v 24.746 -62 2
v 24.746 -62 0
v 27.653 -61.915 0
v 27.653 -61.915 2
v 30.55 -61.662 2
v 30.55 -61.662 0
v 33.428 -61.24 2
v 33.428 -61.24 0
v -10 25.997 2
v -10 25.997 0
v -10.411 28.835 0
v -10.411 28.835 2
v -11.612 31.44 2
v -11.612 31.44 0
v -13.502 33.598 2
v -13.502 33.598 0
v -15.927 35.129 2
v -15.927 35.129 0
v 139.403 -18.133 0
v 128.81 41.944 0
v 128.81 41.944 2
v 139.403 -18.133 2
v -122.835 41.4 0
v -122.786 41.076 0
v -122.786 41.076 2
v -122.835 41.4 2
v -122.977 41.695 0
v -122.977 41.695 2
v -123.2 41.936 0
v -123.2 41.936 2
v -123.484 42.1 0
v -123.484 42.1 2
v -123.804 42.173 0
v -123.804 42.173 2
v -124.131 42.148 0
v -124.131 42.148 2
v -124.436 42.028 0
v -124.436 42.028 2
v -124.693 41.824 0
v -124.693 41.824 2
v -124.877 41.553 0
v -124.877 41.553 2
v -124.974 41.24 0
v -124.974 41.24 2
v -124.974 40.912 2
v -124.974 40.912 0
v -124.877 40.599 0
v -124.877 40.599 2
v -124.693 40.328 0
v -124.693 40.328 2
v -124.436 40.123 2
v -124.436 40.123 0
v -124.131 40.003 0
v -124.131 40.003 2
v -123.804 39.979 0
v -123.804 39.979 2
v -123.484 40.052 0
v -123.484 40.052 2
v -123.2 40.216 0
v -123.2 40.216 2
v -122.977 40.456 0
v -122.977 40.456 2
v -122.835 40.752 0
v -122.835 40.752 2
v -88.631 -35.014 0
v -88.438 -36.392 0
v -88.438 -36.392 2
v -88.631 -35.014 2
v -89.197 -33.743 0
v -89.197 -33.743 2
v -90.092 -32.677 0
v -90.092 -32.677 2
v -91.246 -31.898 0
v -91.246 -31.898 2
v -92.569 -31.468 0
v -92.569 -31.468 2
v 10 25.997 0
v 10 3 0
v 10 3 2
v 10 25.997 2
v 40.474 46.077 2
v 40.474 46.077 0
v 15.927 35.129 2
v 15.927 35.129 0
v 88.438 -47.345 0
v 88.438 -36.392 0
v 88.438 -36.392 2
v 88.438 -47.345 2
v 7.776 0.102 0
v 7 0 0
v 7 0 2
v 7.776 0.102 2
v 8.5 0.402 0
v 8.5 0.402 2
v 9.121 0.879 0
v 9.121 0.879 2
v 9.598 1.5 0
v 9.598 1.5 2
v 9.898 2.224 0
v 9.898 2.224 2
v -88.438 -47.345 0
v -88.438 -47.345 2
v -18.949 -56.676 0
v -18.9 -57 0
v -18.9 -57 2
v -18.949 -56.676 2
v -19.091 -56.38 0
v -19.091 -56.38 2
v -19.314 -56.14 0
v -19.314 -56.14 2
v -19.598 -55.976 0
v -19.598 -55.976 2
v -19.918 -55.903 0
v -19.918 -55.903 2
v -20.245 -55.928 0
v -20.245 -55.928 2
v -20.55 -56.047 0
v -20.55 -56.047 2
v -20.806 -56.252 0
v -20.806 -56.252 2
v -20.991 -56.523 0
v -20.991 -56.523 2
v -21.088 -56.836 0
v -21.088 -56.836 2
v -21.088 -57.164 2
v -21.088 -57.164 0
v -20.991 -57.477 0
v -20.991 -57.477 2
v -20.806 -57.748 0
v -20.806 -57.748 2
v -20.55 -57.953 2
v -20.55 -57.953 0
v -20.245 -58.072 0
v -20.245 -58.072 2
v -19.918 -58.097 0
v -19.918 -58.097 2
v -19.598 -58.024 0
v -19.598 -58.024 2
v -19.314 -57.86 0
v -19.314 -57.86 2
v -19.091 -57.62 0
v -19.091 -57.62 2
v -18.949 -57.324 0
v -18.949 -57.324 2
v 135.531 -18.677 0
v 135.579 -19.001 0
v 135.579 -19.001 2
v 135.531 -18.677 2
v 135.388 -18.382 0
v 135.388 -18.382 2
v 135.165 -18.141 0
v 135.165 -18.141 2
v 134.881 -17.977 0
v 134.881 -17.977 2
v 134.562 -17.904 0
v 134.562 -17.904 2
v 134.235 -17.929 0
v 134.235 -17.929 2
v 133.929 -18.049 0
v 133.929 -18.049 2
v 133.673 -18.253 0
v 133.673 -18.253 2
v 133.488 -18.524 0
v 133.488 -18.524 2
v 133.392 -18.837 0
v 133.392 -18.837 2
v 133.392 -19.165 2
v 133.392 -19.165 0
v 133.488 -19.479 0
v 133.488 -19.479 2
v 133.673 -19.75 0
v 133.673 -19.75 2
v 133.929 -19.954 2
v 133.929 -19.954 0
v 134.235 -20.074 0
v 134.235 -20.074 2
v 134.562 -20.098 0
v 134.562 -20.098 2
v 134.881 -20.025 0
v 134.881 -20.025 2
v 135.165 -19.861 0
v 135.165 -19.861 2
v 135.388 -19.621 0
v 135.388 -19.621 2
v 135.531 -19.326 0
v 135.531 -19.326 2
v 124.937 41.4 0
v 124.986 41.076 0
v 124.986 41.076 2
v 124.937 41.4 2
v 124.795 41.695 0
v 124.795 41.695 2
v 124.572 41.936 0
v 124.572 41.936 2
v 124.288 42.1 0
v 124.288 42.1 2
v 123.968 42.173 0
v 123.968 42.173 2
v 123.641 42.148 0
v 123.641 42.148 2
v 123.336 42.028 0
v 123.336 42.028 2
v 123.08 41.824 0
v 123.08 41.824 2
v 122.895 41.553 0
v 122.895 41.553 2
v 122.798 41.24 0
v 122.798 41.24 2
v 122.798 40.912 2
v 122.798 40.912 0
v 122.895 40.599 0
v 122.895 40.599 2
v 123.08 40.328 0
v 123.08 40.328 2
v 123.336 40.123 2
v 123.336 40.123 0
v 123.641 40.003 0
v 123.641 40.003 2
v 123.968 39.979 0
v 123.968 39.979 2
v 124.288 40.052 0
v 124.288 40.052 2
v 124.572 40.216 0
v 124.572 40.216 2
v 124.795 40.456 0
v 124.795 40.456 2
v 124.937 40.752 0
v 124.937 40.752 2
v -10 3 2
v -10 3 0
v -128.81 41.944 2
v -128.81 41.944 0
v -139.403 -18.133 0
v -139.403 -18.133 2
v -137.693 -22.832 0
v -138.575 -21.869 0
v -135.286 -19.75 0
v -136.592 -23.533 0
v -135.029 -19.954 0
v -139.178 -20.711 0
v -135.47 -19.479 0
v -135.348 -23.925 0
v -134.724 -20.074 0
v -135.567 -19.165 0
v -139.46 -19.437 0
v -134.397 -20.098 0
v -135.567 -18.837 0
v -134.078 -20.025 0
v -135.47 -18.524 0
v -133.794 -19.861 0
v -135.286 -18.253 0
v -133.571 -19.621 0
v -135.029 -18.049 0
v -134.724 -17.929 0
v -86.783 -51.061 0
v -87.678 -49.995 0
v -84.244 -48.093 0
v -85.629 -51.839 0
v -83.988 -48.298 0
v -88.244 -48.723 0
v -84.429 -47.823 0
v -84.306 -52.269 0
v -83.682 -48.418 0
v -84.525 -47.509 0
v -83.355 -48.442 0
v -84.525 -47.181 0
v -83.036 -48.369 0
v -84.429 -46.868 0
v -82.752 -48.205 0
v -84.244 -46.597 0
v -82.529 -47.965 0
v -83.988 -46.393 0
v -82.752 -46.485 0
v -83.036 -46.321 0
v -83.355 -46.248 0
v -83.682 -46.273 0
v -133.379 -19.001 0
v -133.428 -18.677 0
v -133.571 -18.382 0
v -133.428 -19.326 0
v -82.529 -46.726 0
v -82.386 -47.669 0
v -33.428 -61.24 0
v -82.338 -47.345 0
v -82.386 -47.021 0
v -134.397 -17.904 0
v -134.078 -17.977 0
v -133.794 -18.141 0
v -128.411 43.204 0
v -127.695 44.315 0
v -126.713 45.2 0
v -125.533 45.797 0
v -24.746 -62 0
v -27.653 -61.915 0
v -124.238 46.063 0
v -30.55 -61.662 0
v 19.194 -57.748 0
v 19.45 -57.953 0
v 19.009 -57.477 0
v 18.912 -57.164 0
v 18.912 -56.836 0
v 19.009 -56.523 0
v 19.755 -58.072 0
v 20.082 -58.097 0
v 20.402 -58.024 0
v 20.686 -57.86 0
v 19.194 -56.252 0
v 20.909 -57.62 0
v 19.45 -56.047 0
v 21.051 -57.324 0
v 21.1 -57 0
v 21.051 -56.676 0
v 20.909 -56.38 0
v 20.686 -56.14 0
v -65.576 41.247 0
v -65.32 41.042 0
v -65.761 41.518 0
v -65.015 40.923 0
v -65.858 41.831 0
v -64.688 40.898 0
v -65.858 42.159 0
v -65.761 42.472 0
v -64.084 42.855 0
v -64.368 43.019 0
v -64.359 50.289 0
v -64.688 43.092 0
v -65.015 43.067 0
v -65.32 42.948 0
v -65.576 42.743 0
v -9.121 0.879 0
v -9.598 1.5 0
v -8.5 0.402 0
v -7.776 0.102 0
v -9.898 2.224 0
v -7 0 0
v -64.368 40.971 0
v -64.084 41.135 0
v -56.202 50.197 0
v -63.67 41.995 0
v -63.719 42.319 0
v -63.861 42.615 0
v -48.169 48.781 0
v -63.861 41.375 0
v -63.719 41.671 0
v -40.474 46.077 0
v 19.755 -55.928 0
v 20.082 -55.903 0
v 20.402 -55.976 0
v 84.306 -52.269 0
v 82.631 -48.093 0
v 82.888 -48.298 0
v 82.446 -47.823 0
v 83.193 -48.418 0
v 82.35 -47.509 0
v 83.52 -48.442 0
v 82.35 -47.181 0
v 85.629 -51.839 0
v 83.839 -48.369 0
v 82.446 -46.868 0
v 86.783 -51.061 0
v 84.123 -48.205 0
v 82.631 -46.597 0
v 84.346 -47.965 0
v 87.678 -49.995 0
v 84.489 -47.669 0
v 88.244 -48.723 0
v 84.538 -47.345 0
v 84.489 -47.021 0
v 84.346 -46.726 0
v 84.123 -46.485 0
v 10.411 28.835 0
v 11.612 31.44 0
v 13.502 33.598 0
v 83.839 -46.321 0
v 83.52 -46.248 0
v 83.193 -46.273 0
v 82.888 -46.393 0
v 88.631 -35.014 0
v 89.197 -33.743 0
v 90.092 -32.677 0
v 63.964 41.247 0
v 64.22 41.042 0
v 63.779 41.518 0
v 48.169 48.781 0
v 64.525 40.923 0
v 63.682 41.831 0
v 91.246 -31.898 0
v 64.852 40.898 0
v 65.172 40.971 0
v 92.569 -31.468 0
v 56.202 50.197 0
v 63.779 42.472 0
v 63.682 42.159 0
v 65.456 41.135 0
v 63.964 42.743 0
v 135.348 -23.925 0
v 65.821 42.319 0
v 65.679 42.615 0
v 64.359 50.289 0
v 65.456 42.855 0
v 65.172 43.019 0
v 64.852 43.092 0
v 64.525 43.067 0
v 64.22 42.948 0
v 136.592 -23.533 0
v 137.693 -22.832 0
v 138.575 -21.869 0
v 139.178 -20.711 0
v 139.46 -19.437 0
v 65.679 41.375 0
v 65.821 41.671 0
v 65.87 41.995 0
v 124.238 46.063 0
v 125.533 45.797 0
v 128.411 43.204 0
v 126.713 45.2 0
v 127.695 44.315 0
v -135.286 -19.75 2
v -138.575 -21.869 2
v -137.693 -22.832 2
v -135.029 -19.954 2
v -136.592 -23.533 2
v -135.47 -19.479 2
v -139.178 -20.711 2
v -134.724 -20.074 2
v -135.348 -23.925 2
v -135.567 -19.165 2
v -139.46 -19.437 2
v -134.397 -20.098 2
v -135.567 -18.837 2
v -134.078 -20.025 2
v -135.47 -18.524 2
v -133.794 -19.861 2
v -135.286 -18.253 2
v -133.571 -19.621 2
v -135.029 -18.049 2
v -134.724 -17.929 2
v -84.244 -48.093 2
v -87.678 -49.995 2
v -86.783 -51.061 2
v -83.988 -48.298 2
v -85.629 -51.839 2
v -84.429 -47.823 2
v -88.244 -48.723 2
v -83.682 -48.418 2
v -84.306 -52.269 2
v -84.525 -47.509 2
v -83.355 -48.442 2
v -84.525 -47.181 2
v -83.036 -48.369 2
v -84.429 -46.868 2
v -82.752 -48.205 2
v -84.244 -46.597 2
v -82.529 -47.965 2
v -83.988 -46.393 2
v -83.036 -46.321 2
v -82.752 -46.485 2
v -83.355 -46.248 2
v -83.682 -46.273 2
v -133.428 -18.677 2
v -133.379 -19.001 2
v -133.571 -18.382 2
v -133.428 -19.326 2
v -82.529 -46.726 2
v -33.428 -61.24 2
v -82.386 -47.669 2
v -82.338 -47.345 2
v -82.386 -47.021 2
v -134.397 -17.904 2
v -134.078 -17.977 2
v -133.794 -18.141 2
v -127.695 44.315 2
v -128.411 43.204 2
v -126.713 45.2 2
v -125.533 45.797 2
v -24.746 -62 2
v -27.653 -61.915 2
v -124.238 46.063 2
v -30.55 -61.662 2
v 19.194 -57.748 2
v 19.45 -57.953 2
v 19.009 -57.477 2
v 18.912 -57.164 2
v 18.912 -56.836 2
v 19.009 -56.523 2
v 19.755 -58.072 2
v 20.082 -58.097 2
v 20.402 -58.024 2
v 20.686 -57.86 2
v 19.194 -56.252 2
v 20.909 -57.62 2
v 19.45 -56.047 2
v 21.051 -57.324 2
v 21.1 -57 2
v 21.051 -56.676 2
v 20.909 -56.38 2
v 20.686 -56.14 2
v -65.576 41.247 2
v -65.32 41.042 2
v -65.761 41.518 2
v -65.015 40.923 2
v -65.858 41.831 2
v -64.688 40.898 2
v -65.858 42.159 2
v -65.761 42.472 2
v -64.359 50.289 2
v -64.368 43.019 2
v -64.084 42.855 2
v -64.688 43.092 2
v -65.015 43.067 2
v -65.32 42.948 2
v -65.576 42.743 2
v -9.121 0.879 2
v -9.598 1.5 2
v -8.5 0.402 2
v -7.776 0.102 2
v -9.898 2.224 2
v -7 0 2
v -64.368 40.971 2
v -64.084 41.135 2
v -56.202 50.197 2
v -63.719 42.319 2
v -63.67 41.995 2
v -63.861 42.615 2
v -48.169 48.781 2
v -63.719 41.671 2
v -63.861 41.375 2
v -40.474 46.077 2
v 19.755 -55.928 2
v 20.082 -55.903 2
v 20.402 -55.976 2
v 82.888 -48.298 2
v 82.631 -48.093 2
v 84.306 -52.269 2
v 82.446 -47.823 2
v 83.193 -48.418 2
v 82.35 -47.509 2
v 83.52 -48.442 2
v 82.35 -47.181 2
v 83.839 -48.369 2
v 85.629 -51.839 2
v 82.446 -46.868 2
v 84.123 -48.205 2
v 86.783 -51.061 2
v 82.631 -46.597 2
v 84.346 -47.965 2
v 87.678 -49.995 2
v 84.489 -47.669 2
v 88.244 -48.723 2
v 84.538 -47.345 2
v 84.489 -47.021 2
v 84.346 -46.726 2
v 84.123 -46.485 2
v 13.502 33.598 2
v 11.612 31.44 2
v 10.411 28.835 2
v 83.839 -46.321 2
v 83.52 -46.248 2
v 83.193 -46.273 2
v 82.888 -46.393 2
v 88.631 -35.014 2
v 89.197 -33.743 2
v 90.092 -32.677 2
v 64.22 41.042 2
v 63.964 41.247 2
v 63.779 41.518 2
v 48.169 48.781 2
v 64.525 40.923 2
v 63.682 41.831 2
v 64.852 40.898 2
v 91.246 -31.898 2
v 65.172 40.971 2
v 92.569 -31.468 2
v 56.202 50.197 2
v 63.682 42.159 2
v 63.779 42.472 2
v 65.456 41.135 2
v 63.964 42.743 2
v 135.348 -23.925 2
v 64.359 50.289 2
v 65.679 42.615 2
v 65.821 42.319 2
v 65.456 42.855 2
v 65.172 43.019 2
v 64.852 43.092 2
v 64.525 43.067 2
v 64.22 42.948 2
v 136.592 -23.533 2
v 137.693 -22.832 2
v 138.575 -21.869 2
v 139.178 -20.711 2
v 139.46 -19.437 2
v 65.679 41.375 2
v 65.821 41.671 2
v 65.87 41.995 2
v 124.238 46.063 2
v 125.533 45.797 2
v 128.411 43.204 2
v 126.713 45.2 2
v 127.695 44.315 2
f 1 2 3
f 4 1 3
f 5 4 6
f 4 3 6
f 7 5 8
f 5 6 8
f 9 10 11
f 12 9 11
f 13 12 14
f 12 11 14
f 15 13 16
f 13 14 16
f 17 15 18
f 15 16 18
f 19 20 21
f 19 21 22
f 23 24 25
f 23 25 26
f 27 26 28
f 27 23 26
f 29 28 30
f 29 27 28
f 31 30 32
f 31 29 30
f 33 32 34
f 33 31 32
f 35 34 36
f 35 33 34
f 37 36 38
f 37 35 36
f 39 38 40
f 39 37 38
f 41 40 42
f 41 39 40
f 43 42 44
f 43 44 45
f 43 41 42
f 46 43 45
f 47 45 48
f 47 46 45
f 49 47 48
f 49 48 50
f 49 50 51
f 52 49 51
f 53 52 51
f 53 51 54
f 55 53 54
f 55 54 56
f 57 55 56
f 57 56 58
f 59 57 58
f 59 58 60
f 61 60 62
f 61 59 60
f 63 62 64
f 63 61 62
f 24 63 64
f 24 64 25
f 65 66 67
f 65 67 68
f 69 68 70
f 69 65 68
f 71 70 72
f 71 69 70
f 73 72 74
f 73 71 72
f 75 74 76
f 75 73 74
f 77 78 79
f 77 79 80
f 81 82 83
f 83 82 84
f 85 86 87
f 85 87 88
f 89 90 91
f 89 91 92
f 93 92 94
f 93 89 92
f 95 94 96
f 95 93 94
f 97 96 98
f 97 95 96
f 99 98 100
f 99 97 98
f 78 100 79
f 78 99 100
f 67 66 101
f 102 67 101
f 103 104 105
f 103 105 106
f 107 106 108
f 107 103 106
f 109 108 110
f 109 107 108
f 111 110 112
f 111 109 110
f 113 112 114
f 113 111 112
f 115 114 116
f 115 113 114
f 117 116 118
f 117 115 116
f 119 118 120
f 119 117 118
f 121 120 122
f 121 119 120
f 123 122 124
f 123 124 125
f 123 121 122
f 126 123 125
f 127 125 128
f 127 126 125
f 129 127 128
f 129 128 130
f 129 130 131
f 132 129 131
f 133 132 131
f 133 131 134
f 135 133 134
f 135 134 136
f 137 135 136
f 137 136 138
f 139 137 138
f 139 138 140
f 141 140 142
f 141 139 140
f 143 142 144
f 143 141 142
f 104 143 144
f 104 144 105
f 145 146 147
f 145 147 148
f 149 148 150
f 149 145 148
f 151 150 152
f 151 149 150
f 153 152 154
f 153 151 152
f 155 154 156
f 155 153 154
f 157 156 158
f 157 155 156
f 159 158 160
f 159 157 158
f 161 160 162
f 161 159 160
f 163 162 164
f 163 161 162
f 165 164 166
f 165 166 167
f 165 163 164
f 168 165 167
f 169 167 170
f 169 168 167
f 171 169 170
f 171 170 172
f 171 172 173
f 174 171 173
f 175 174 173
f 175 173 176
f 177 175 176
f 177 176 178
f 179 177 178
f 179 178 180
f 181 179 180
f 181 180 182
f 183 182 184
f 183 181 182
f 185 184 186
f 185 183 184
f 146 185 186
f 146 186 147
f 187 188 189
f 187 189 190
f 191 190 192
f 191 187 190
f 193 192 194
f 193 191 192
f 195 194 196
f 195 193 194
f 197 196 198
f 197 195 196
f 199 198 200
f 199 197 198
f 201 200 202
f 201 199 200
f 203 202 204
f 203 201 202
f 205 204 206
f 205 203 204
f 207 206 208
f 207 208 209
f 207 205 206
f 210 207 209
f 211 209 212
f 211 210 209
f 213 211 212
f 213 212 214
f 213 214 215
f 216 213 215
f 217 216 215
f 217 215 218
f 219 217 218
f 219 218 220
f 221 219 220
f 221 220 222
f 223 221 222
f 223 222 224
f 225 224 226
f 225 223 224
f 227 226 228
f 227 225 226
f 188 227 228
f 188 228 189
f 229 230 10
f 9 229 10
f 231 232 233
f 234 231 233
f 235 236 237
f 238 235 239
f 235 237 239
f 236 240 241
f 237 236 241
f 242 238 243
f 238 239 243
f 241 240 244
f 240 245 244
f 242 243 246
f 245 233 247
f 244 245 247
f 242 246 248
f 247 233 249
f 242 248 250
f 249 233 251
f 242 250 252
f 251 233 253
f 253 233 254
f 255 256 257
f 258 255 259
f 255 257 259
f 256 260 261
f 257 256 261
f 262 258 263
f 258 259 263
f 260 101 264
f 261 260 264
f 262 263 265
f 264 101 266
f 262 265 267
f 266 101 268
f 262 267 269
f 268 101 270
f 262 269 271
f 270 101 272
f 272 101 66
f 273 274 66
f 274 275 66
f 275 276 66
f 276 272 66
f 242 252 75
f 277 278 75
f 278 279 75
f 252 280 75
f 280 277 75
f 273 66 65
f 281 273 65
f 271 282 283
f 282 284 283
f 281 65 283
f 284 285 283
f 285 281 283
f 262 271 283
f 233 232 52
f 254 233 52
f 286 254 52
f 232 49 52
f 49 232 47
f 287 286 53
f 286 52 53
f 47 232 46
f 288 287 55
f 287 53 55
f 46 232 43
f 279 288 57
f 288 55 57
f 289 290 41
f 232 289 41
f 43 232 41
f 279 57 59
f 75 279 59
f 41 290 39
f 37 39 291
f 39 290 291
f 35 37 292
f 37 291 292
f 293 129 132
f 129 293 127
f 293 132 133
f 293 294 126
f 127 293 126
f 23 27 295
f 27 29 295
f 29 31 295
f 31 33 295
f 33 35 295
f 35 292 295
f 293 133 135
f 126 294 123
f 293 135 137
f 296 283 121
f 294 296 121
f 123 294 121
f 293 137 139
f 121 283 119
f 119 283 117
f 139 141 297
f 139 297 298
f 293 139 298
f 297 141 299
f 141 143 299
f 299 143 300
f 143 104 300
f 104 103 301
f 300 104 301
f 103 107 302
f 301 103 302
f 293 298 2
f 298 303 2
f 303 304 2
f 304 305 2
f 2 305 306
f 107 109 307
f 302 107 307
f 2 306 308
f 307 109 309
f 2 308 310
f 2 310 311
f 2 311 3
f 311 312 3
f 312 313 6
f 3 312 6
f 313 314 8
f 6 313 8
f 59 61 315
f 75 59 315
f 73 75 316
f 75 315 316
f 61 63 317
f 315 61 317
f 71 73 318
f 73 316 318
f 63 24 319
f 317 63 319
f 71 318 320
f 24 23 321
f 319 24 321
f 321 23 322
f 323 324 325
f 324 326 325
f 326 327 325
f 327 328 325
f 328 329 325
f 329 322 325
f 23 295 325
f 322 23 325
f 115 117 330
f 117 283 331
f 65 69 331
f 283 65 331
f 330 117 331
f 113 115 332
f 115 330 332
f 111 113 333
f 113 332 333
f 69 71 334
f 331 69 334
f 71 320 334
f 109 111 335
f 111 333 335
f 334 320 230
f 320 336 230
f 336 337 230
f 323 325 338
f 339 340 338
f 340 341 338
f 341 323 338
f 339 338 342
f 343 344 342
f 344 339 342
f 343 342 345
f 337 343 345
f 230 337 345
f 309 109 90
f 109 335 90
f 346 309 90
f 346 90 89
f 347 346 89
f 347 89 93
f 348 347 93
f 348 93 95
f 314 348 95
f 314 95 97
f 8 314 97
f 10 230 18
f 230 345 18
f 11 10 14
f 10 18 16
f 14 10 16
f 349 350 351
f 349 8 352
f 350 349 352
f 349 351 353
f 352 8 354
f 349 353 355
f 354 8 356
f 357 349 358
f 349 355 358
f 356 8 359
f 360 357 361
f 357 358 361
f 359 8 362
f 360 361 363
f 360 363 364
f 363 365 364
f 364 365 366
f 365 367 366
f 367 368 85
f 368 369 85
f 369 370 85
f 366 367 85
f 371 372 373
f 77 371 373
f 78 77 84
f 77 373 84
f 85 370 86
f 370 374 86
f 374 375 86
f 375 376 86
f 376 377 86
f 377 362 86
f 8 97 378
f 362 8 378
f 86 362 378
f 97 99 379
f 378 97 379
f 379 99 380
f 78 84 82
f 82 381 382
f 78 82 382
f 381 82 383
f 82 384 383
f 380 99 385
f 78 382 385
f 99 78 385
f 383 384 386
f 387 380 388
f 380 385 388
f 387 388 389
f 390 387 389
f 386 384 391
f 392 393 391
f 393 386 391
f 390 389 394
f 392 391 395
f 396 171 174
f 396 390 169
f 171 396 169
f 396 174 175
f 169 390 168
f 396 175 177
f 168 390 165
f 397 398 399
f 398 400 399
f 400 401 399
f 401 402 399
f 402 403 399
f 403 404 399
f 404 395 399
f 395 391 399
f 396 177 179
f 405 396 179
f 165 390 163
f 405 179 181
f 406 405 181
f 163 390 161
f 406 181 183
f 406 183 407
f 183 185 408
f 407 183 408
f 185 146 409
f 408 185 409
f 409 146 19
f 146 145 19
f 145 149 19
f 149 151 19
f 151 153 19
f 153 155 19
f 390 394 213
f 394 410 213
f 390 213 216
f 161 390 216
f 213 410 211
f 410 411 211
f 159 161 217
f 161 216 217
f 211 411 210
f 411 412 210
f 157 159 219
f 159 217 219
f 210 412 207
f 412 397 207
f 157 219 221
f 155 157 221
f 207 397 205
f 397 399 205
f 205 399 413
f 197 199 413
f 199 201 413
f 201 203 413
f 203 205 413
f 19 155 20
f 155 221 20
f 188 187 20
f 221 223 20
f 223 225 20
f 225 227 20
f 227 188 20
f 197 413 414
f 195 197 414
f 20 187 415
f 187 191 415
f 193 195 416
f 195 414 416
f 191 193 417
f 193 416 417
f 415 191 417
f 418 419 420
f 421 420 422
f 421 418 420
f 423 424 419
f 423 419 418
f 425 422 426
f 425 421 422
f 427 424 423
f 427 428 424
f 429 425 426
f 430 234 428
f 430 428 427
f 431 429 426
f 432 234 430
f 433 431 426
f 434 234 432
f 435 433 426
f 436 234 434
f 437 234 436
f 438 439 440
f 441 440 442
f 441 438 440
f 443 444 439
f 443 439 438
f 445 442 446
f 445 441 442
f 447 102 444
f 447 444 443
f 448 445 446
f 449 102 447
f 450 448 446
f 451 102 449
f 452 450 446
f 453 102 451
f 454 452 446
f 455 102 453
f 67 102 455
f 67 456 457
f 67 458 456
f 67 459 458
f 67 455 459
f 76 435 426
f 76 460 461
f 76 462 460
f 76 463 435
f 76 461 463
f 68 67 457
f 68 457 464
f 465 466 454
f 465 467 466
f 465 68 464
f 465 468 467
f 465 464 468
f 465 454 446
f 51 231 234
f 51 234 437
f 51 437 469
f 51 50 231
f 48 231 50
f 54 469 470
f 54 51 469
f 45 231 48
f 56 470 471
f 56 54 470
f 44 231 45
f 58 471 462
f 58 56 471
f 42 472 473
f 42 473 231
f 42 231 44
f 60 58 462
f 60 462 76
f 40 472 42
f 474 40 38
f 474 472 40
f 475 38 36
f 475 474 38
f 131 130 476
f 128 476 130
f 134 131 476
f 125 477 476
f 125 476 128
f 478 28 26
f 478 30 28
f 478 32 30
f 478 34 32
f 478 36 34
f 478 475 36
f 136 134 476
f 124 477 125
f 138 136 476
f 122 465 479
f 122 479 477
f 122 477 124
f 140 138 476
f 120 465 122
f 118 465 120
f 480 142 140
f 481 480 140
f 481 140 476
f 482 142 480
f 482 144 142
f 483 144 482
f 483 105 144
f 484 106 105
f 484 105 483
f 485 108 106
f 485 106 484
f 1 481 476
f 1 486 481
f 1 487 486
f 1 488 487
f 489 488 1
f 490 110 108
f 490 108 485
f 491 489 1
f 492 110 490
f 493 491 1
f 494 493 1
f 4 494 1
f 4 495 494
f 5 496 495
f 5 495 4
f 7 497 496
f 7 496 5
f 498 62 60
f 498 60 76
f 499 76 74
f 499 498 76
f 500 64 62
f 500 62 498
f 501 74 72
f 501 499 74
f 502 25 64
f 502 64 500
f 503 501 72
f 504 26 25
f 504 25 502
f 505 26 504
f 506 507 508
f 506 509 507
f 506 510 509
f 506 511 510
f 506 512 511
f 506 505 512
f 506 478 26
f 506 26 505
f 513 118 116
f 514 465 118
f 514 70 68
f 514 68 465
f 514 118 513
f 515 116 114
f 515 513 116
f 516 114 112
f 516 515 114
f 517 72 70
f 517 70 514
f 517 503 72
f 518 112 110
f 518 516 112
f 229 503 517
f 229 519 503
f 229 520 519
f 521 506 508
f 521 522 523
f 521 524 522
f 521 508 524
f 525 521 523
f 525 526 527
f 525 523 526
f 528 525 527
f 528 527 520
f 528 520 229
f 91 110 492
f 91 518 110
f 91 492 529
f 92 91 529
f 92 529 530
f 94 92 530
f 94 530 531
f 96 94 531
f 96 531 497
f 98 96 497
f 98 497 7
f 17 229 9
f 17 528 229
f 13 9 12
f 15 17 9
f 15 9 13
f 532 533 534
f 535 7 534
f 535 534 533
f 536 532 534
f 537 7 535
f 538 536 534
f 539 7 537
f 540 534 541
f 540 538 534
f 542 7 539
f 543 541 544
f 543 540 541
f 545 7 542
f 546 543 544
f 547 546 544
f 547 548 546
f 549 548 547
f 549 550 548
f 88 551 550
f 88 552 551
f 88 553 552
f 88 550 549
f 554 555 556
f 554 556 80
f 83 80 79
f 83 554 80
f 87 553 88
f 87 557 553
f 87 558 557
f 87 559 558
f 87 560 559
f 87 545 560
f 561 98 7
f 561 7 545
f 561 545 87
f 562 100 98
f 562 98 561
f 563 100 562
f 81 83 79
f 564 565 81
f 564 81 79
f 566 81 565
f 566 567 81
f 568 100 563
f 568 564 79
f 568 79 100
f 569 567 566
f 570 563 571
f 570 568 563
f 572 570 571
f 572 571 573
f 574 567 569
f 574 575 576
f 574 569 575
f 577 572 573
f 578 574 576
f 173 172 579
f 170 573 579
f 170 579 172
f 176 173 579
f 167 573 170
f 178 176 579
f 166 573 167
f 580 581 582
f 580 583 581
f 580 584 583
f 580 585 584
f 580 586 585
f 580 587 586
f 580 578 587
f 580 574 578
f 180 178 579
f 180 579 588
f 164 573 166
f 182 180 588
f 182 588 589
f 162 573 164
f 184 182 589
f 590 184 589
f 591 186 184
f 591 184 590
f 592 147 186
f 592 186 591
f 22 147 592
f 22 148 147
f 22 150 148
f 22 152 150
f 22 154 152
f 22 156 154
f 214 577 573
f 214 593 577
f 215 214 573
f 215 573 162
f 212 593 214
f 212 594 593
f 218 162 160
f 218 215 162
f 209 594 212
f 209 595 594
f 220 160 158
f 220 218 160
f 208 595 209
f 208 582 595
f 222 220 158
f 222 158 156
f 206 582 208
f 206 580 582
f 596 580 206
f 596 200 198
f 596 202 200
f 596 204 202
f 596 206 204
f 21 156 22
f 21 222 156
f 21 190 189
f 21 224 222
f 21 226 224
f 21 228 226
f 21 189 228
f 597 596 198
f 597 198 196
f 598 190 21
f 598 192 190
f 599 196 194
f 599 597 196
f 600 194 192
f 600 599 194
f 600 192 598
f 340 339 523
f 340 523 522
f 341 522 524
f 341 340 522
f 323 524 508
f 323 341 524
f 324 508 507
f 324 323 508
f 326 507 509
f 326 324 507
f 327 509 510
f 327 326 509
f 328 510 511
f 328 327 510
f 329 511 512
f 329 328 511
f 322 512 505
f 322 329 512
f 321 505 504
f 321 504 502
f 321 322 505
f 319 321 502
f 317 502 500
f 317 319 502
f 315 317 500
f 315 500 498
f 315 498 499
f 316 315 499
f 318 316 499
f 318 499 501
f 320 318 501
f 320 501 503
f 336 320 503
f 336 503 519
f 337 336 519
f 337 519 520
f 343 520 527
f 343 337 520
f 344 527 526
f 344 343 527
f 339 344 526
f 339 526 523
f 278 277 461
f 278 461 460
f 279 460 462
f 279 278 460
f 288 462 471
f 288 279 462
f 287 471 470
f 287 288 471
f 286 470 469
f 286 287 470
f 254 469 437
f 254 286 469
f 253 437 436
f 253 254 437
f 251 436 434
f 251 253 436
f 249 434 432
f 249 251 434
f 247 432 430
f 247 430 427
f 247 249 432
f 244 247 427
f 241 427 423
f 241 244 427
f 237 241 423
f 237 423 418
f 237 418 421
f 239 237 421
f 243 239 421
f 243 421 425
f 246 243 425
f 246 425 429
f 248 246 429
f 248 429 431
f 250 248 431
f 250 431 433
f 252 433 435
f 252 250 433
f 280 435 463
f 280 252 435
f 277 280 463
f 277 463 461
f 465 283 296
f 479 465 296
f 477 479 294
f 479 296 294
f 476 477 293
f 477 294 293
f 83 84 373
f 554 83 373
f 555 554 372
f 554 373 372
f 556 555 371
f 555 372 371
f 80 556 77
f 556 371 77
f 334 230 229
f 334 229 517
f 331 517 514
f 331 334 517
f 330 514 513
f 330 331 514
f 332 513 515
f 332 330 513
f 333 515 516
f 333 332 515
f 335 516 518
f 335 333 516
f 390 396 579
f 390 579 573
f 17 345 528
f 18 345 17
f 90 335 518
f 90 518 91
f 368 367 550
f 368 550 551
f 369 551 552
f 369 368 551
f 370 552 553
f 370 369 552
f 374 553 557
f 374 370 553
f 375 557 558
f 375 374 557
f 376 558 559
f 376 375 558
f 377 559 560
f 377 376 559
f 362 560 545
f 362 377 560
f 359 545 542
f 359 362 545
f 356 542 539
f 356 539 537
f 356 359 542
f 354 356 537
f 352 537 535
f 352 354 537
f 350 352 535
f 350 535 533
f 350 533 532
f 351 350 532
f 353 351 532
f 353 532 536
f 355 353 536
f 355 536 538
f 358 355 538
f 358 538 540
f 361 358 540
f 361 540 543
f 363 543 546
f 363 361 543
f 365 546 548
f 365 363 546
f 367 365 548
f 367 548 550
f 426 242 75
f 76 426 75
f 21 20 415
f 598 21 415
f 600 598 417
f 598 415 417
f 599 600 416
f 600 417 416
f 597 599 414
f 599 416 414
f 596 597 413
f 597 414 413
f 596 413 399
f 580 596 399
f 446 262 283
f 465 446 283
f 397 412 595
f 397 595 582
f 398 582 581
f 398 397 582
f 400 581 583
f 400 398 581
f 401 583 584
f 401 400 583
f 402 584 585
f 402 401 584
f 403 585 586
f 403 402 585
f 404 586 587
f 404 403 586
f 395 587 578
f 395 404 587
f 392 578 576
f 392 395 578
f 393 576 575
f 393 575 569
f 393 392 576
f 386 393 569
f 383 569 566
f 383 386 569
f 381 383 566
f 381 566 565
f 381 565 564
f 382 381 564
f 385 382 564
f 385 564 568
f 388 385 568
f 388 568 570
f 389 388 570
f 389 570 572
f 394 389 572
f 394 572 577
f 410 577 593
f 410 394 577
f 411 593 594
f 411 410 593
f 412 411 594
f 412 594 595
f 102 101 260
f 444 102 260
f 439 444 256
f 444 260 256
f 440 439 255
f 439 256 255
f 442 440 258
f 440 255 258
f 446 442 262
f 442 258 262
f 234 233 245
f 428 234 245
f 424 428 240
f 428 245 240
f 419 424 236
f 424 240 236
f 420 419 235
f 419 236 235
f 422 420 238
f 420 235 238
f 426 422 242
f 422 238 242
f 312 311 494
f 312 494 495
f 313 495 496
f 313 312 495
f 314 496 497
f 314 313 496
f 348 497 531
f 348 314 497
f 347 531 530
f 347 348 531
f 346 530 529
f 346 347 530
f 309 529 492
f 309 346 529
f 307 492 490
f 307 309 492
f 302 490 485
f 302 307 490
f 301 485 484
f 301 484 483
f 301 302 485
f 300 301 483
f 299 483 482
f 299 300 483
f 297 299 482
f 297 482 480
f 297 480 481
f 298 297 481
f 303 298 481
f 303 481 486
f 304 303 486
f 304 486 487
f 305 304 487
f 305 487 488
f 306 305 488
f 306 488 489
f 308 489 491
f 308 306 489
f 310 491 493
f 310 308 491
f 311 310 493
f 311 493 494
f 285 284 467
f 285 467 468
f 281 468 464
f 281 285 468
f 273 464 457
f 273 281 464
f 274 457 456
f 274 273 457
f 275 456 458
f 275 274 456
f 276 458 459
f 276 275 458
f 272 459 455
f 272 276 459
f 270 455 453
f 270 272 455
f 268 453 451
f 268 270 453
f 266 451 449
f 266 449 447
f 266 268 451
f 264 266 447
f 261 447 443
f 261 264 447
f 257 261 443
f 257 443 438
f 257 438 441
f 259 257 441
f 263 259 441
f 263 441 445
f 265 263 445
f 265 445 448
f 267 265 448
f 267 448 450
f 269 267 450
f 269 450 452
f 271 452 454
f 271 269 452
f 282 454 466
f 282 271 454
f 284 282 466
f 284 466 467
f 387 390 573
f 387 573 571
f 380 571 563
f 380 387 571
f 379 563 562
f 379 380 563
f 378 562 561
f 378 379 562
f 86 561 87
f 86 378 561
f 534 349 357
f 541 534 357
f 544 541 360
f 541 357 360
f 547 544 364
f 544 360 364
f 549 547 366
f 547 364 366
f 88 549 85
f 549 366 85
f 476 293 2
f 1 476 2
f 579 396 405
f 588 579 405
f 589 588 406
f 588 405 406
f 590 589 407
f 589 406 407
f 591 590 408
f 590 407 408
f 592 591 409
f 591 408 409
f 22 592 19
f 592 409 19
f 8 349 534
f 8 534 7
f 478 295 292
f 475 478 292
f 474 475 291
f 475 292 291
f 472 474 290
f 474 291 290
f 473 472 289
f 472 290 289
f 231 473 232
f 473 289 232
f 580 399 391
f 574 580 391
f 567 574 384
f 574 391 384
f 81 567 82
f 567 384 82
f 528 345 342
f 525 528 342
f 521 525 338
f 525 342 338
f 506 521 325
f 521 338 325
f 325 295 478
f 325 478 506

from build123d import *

# Parameters (mm, degrees)
SKETCH_R  = 1.1
PAD_DEPTH = 2


with BuildPart() as part:
    # Sketch → Pad (new body)
    with BuildSketch(Plane.XY):
        with BuildLine():
            ThreePointArc((-124.238101, 46.063372), (-127.232991, 44.790439), (-128.810202, 41.944014))
            Line((-128.810202, 41.944014), (-139.403415, -18.133082))
            ThreePointArc((-139.403415, -18.133082), (-138.575137, -21.869205), (-135.347617, -23.925361))
            Line((-135.347617, -23.925361), (-92.569259, -31.46834))
            ThreePointArc((-88.4375, -36.392379), (-89.607278, -33.178441), (-92.569259, -31.46834))
            Line((-88.4375, -36.392379), (-88.4375, -47.34526))
            ThreePointArc((-88.4375, -47.34526), (-87.267722, -50.559198), (-84.305741, -52.269298))
            Line((-84.305741, -52.269298), (-33.428165, -61.240388))
            ThreePointArc((-33.428165, -61.240388), (-29.103544, -61.809735), (-24.745757, -62))
            Line((-24.745757, -62), (24.745757, -62))
            ThreePointArc((24.745757, -62), (29.103544, -61.809735), (33.428165, -61.240388))
            Line((84.305741, -52.269298), (33.428165, -61.240388))
            ThreePointArc((84.305741, -52.269298), (87.267722, -50.559198), (88.4375, -47.34526))
            Line((88.4375, -36.392379), (88.4375, -47.34526))
            ThreePointArc((92.569259, -31.46834), (89.607278, -33.178441), (88.4375, -36.392379))
            Line((135.347617, -23.925361), (92.569259, -31.46834))
            ThreePointArc((135.347617, -23.925361), (138.575137, -21.869205), (139.403415, -18.133082))
            Line((128.810202, 41.944014), (139.403415, -18.133082))
            ThreePointArc((128.810202, 41.944014), (127.232991, 44.790439), (124.238101, 46.063372))
            Line((124.238101, 46.063372), (64.358799, 50.288605))
            ThreePointArc((64.358799, 50.288605), (52.157015, 49.653007), (40.473702, 46.077018))
            Line((40.473702, 46.077018), (15.926856, 35.129447))
            ThreePointArc((15.926856, 35.129447), (11.611572, 31.440305), (10, 25.996567))
            Line((10, 3), (10, 25.996567))
            ThreePointArc((7, 0), (9.12132, 0.87868), (10, 3))
            Line((-7, 0), (7, 0))
            ThreePointArc((-10, 3), (-9.12132, 0.87868), (-7, 0))
            Line((-10, 3), (-10, 25.996567))
            ThreePointArc((-10, 25.996567), (-11.611572, 31.440305), (-15.926856, 35.129447))
            Line((-40.473702, 46.077018), (-15.926856, 35.129447))
            ThreePointArc((-40.473702, 46.077018), (-52.157015, 49.653007), (-64.358799, 50.288605))
            Line((-124.238101, 46.063372), (-64.358799, 50.288605))
        make_face()
        with Locations((123.886163, 41.075773)):
            Circle(SKETCH_R, mode=Mode.SUBTRACT)
        with Locations((134.479376, -19.001323)):
            Circle(SKETCH_R, mode=Mode.SUBTRACT)
        with Locations((83.4375, -47.34526)):
            Circle(SKETCH_R, mode=Mode.SUBTRACT)
        with Locations((20, -57)):
            Circle(SKETCH_R, mode=Mode.SUBTRACT)
        with Locations((-20, -57)):
            Circle(SKETCH_R, mode=Mode.SUBTRACT)
        with Locations((-83.4375, -47.34526)):
            Circle(SKETCH_R, mode=Mode.SUBTRACT)
        with Locations((-134.479376, -19.001323)):
            Circle(SKETCH_R, mode=Mode.SUBTRACT)
        with Locations((-64.77, 41.995)):
            Circle(SKETCH_R, mode=Mode.SUBTRACT)
        with Locations((-123.886163, 41.075773)):
            Circle(SKETCH_R, mode=Mode.SUBTRACT)
        with Locations((64.77, 41.995)):
            Circle(SKETCH_R, mode=Mode.SUBTRACT)
    extrude(amount=PAD_DEPTH)


solid = part.part
